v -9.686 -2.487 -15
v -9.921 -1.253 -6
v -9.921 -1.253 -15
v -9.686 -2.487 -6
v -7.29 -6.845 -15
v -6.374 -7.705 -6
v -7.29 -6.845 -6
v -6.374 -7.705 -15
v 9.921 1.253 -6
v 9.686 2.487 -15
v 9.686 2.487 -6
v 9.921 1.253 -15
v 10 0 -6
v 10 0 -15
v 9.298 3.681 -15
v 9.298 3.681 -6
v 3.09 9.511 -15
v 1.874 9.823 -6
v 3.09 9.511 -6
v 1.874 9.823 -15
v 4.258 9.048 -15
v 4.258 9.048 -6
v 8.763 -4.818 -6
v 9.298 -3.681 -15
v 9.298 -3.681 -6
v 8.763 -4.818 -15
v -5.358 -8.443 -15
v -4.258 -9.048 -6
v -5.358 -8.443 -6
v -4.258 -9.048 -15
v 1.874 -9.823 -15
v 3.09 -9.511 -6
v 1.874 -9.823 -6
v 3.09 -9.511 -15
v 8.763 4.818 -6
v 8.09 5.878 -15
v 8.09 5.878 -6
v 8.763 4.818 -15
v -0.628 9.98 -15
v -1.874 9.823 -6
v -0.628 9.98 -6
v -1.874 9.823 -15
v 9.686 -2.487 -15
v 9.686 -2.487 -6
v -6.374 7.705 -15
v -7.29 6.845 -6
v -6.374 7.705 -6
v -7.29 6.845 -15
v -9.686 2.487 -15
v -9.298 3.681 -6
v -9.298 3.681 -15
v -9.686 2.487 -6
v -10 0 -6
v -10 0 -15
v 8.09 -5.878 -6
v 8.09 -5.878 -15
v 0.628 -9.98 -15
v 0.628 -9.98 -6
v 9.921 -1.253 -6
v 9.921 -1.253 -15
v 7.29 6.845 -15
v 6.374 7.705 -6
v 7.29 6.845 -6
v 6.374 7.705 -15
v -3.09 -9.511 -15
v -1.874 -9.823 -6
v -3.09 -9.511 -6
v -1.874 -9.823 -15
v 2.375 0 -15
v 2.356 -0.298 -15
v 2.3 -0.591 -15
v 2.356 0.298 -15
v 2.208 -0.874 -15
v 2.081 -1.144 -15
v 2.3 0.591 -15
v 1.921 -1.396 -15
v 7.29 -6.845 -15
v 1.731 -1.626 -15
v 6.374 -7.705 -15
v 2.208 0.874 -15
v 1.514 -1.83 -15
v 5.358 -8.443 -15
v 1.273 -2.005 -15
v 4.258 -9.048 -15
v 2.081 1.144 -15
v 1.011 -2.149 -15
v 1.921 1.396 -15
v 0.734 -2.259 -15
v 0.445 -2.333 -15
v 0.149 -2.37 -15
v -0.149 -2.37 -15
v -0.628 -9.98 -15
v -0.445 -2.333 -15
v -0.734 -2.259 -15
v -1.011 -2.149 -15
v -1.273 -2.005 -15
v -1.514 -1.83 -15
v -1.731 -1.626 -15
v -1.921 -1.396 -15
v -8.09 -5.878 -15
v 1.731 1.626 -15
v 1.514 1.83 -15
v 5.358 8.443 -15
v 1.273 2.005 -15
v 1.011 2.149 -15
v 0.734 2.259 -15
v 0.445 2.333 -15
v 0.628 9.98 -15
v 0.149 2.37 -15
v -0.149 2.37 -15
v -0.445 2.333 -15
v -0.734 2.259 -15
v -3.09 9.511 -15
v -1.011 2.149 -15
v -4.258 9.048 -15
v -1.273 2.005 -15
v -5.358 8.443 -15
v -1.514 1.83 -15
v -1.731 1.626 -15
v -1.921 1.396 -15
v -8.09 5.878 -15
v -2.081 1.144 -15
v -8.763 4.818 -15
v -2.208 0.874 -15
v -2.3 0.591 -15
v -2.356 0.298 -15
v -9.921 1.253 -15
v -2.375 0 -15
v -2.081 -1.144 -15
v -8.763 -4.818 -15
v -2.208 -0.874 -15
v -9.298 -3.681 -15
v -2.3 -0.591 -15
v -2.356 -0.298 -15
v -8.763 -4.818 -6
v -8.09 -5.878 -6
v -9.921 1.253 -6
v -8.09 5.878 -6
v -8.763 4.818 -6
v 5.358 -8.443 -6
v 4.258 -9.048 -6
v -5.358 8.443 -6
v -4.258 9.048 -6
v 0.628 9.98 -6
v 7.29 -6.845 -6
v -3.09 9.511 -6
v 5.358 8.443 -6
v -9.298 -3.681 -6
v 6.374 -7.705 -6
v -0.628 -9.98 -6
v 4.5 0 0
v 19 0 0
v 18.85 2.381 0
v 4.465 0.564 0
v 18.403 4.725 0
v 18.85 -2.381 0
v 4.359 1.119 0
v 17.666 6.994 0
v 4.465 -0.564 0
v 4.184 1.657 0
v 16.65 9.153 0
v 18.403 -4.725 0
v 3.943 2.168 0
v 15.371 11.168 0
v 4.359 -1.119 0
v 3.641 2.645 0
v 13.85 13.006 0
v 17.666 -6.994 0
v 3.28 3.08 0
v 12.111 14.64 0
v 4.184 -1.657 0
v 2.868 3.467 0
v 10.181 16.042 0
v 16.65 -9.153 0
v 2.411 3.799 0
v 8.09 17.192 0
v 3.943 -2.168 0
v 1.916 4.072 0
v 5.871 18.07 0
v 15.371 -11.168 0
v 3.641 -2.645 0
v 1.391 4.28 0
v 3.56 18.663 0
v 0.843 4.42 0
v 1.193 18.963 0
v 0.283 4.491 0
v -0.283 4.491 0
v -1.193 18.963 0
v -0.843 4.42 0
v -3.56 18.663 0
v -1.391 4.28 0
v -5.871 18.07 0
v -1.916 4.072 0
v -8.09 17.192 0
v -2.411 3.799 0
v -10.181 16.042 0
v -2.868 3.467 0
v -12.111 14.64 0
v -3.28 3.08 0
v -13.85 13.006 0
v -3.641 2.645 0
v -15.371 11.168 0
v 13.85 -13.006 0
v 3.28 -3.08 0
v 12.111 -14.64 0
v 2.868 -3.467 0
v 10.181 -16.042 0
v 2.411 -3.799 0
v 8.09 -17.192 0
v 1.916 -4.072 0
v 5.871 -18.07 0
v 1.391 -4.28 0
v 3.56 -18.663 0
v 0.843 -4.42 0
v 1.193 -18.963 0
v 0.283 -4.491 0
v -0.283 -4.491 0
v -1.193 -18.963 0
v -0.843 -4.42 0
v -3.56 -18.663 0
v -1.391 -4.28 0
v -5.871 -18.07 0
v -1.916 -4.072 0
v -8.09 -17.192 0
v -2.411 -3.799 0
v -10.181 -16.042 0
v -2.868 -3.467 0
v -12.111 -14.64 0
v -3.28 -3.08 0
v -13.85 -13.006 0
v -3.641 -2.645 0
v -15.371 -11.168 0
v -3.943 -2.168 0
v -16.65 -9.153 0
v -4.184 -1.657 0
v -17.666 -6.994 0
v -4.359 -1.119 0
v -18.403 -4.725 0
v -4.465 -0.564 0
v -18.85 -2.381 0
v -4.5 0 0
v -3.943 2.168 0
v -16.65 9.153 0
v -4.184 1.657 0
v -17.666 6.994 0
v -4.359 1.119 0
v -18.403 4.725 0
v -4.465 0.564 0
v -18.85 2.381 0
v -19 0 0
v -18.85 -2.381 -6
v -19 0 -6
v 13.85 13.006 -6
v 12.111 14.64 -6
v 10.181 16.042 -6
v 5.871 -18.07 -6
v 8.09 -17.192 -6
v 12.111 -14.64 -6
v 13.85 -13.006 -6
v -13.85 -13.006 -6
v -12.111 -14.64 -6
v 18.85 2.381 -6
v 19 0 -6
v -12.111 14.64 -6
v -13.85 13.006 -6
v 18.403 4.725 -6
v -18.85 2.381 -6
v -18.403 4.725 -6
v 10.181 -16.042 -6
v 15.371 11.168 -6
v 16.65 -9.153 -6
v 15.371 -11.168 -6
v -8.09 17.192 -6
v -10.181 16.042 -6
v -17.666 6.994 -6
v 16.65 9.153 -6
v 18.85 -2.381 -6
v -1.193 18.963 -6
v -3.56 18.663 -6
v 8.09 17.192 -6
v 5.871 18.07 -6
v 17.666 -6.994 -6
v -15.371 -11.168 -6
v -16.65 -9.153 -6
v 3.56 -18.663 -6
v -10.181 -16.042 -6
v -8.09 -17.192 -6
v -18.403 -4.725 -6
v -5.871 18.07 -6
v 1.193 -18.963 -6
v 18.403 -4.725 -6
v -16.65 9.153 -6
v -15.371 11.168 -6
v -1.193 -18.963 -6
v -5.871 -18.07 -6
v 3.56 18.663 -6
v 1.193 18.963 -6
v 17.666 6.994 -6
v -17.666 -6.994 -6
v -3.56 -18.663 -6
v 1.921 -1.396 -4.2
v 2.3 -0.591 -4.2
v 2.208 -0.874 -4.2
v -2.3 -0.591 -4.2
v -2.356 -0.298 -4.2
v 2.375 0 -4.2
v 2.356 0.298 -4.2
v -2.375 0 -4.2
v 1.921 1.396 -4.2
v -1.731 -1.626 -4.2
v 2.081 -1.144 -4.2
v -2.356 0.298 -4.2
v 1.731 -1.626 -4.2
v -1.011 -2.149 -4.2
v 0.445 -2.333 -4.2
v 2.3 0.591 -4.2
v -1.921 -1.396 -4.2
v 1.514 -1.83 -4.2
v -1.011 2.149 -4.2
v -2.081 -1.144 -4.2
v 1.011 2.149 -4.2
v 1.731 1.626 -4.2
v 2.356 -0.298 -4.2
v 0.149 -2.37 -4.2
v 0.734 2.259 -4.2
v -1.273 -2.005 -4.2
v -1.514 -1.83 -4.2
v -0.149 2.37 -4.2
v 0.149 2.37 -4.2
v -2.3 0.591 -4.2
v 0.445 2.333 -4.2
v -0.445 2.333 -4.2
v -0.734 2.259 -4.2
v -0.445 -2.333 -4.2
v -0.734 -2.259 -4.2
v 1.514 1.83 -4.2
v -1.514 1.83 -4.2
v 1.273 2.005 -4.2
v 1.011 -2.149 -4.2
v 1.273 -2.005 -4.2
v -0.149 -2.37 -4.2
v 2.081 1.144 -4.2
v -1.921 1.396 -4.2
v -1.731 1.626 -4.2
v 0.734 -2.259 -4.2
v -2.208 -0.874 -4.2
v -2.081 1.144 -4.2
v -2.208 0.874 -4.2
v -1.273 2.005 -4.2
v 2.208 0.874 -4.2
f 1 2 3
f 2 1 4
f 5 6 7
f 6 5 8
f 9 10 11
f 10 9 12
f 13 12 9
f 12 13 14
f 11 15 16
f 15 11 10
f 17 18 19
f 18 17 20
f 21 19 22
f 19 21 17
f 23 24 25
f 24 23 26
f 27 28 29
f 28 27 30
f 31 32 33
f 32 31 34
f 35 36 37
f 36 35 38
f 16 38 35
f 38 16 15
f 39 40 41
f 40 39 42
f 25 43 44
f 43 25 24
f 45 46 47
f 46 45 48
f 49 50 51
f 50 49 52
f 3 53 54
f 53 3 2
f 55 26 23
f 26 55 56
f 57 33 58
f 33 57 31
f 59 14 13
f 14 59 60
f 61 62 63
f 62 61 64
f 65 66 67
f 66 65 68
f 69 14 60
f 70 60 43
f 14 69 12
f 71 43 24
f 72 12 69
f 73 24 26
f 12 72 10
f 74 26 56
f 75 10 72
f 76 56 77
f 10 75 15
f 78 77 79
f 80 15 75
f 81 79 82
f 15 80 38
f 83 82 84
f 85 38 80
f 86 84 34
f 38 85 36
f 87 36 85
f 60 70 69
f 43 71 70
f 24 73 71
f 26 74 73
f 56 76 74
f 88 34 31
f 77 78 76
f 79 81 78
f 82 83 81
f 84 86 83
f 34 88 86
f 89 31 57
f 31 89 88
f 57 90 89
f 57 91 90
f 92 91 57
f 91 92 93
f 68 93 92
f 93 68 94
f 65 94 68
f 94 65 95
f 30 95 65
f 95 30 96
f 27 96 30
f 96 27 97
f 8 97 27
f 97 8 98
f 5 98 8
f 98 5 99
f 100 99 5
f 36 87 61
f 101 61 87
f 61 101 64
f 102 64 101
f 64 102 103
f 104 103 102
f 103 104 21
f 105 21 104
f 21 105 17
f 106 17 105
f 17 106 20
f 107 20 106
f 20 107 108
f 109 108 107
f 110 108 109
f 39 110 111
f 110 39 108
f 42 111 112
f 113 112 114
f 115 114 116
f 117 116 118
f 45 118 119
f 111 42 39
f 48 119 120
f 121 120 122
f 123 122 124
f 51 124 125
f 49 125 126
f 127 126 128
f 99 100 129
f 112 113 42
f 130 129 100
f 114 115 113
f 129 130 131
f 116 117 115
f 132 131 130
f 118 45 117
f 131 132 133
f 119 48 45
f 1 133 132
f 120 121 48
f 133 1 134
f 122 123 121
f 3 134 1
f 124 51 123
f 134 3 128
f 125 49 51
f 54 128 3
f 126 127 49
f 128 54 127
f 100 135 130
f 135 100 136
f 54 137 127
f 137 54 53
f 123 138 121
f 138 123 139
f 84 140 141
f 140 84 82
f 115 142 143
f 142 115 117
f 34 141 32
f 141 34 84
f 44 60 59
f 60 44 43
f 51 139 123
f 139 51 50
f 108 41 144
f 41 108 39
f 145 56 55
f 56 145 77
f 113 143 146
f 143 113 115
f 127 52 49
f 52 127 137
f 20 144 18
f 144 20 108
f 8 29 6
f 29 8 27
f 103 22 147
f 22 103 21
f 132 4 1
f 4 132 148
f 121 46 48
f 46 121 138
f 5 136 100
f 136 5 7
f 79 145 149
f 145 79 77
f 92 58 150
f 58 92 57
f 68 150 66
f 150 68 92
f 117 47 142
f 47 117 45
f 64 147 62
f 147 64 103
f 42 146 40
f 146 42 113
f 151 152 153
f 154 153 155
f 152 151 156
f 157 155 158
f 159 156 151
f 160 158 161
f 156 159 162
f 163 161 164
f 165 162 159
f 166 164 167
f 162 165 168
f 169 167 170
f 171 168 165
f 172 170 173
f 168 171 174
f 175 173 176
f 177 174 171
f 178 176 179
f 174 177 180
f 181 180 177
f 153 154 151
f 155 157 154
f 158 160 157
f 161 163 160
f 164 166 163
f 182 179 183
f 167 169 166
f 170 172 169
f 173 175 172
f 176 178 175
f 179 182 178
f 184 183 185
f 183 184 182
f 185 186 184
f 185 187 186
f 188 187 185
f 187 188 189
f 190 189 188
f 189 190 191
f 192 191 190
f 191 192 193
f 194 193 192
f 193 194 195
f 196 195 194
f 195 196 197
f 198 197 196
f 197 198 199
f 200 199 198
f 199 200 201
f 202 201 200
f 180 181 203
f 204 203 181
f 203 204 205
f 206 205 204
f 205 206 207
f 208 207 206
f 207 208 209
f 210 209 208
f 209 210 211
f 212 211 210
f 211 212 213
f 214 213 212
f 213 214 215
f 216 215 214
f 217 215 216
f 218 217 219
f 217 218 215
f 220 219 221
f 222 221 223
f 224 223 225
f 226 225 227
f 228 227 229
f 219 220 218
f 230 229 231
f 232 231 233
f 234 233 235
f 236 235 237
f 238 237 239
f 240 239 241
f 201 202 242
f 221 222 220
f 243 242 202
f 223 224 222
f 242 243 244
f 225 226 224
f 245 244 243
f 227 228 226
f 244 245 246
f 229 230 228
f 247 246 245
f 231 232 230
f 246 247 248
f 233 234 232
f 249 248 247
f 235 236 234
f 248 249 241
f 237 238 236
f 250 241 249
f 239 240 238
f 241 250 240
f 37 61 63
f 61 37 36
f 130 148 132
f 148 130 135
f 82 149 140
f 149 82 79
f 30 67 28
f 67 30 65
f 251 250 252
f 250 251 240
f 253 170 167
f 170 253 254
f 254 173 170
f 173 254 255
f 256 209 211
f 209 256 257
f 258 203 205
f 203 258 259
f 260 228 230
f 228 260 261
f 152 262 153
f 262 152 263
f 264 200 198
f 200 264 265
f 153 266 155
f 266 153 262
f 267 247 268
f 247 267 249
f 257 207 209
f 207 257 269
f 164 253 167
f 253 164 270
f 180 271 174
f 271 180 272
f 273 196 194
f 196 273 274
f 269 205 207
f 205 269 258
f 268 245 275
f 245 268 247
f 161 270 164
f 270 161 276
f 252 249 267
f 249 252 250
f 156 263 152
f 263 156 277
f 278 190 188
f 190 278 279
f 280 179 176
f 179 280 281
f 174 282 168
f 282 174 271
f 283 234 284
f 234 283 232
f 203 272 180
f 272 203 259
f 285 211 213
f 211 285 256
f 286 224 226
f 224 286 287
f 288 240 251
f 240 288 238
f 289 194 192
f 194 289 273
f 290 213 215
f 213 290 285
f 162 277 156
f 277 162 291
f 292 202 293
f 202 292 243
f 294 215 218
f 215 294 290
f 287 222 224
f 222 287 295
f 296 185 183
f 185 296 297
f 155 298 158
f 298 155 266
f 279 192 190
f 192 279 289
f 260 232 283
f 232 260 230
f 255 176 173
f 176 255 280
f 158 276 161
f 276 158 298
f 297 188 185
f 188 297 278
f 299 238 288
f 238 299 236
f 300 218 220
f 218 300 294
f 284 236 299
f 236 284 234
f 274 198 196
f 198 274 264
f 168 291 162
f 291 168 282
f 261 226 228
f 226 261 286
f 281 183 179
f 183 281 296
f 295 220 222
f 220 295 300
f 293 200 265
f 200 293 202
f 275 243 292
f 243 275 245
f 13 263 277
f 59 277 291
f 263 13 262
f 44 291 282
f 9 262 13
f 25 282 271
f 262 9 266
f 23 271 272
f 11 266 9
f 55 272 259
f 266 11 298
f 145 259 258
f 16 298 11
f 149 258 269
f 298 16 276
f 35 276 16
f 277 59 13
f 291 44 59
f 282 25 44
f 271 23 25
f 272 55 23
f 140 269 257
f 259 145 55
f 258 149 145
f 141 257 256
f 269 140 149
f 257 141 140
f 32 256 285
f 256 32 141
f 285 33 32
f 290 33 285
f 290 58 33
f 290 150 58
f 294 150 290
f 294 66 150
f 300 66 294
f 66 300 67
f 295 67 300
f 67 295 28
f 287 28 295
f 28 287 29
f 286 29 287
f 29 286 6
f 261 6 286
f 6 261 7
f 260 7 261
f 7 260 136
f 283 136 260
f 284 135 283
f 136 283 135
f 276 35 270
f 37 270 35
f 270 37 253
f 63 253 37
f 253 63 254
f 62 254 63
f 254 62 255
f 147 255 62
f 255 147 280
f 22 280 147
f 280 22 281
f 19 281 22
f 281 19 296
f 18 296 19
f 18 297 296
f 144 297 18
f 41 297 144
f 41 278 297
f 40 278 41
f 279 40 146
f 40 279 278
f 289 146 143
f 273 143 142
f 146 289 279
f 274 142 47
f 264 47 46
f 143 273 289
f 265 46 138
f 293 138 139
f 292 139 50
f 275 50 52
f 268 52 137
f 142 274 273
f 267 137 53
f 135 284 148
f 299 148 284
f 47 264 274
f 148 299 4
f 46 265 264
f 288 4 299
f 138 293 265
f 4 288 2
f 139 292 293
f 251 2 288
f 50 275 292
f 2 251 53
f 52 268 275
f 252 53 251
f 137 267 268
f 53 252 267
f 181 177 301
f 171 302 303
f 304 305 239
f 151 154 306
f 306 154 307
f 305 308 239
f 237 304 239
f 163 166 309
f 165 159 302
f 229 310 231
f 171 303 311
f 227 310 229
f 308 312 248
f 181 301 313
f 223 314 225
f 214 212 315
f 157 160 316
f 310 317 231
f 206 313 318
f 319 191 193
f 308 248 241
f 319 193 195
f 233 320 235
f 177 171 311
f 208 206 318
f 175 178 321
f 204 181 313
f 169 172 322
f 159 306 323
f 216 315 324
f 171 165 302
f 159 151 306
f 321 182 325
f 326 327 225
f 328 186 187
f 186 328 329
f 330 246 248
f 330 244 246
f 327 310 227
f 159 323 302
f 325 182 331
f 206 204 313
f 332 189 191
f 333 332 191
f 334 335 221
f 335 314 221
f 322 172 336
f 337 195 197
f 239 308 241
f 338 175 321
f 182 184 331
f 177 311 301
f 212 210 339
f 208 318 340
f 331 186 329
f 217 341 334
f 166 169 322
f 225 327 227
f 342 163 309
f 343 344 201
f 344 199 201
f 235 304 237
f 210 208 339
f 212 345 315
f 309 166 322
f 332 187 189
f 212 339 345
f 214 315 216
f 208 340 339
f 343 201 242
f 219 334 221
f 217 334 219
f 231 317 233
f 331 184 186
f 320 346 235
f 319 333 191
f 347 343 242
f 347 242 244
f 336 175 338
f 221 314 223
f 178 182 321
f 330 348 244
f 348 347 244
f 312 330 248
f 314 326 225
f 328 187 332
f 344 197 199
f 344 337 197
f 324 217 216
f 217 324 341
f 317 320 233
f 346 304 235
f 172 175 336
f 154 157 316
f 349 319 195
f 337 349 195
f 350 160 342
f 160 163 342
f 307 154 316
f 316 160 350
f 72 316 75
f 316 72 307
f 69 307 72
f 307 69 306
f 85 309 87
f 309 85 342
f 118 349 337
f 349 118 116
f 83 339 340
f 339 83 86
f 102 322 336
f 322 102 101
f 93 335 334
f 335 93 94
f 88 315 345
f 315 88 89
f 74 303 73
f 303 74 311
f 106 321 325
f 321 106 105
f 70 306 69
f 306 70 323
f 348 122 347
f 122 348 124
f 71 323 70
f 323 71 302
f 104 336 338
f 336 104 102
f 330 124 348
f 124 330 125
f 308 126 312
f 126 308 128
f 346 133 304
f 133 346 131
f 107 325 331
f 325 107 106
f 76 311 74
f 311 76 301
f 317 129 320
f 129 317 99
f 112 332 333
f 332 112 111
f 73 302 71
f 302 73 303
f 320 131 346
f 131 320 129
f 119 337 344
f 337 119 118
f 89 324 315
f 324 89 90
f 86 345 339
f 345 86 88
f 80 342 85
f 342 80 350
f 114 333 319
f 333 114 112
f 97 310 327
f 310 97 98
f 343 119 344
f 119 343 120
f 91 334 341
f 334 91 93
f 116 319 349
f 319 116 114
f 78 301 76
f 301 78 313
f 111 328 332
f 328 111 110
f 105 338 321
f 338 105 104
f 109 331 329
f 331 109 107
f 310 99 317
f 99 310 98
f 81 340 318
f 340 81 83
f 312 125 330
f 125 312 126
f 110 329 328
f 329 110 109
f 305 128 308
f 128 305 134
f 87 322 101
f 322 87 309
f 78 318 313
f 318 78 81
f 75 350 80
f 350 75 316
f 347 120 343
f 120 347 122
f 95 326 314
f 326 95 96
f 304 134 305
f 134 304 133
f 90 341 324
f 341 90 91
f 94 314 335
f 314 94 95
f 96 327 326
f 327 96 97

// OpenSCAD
$fn = 50;


difference() {
	union() {
		translate(v = [0, 0, -15.0000000000]) {
			cylinder(h = 15, r = 10.0000000000);
		}
		translate(v = [0, 0, -6.0000000000]) {
			cylinder(h = 6, r = 19.0000000000);
		}
	}
	union() {
		translate(v = [0, 0, 0]) {
			rotate(a = [0, 0, 0]) {
				difference() {
					union() {
						#translate(v = [0, 0, -15.0000000000]) {
							cylinder(h = 15, r = 2.2500000000);
						}
						#translate(v = [0, 0, -4.2000000000]) {
							cylinder(h = 4.2000000000, r = 10.0000000000, r1 = 2.3750000000, r2 = 4.5000000000);
						}
						#translate(v = [0, 0, -15.0000000000]) {
							cylinder(h = 15, r = 2.3750000000);
						}
						#translate(v = [0, 0, -15.0000000000]) {
							cylinder(h = 15, r = 2.2500000000);
						}
					}
					union();
				}
			}
		}
	}
}
